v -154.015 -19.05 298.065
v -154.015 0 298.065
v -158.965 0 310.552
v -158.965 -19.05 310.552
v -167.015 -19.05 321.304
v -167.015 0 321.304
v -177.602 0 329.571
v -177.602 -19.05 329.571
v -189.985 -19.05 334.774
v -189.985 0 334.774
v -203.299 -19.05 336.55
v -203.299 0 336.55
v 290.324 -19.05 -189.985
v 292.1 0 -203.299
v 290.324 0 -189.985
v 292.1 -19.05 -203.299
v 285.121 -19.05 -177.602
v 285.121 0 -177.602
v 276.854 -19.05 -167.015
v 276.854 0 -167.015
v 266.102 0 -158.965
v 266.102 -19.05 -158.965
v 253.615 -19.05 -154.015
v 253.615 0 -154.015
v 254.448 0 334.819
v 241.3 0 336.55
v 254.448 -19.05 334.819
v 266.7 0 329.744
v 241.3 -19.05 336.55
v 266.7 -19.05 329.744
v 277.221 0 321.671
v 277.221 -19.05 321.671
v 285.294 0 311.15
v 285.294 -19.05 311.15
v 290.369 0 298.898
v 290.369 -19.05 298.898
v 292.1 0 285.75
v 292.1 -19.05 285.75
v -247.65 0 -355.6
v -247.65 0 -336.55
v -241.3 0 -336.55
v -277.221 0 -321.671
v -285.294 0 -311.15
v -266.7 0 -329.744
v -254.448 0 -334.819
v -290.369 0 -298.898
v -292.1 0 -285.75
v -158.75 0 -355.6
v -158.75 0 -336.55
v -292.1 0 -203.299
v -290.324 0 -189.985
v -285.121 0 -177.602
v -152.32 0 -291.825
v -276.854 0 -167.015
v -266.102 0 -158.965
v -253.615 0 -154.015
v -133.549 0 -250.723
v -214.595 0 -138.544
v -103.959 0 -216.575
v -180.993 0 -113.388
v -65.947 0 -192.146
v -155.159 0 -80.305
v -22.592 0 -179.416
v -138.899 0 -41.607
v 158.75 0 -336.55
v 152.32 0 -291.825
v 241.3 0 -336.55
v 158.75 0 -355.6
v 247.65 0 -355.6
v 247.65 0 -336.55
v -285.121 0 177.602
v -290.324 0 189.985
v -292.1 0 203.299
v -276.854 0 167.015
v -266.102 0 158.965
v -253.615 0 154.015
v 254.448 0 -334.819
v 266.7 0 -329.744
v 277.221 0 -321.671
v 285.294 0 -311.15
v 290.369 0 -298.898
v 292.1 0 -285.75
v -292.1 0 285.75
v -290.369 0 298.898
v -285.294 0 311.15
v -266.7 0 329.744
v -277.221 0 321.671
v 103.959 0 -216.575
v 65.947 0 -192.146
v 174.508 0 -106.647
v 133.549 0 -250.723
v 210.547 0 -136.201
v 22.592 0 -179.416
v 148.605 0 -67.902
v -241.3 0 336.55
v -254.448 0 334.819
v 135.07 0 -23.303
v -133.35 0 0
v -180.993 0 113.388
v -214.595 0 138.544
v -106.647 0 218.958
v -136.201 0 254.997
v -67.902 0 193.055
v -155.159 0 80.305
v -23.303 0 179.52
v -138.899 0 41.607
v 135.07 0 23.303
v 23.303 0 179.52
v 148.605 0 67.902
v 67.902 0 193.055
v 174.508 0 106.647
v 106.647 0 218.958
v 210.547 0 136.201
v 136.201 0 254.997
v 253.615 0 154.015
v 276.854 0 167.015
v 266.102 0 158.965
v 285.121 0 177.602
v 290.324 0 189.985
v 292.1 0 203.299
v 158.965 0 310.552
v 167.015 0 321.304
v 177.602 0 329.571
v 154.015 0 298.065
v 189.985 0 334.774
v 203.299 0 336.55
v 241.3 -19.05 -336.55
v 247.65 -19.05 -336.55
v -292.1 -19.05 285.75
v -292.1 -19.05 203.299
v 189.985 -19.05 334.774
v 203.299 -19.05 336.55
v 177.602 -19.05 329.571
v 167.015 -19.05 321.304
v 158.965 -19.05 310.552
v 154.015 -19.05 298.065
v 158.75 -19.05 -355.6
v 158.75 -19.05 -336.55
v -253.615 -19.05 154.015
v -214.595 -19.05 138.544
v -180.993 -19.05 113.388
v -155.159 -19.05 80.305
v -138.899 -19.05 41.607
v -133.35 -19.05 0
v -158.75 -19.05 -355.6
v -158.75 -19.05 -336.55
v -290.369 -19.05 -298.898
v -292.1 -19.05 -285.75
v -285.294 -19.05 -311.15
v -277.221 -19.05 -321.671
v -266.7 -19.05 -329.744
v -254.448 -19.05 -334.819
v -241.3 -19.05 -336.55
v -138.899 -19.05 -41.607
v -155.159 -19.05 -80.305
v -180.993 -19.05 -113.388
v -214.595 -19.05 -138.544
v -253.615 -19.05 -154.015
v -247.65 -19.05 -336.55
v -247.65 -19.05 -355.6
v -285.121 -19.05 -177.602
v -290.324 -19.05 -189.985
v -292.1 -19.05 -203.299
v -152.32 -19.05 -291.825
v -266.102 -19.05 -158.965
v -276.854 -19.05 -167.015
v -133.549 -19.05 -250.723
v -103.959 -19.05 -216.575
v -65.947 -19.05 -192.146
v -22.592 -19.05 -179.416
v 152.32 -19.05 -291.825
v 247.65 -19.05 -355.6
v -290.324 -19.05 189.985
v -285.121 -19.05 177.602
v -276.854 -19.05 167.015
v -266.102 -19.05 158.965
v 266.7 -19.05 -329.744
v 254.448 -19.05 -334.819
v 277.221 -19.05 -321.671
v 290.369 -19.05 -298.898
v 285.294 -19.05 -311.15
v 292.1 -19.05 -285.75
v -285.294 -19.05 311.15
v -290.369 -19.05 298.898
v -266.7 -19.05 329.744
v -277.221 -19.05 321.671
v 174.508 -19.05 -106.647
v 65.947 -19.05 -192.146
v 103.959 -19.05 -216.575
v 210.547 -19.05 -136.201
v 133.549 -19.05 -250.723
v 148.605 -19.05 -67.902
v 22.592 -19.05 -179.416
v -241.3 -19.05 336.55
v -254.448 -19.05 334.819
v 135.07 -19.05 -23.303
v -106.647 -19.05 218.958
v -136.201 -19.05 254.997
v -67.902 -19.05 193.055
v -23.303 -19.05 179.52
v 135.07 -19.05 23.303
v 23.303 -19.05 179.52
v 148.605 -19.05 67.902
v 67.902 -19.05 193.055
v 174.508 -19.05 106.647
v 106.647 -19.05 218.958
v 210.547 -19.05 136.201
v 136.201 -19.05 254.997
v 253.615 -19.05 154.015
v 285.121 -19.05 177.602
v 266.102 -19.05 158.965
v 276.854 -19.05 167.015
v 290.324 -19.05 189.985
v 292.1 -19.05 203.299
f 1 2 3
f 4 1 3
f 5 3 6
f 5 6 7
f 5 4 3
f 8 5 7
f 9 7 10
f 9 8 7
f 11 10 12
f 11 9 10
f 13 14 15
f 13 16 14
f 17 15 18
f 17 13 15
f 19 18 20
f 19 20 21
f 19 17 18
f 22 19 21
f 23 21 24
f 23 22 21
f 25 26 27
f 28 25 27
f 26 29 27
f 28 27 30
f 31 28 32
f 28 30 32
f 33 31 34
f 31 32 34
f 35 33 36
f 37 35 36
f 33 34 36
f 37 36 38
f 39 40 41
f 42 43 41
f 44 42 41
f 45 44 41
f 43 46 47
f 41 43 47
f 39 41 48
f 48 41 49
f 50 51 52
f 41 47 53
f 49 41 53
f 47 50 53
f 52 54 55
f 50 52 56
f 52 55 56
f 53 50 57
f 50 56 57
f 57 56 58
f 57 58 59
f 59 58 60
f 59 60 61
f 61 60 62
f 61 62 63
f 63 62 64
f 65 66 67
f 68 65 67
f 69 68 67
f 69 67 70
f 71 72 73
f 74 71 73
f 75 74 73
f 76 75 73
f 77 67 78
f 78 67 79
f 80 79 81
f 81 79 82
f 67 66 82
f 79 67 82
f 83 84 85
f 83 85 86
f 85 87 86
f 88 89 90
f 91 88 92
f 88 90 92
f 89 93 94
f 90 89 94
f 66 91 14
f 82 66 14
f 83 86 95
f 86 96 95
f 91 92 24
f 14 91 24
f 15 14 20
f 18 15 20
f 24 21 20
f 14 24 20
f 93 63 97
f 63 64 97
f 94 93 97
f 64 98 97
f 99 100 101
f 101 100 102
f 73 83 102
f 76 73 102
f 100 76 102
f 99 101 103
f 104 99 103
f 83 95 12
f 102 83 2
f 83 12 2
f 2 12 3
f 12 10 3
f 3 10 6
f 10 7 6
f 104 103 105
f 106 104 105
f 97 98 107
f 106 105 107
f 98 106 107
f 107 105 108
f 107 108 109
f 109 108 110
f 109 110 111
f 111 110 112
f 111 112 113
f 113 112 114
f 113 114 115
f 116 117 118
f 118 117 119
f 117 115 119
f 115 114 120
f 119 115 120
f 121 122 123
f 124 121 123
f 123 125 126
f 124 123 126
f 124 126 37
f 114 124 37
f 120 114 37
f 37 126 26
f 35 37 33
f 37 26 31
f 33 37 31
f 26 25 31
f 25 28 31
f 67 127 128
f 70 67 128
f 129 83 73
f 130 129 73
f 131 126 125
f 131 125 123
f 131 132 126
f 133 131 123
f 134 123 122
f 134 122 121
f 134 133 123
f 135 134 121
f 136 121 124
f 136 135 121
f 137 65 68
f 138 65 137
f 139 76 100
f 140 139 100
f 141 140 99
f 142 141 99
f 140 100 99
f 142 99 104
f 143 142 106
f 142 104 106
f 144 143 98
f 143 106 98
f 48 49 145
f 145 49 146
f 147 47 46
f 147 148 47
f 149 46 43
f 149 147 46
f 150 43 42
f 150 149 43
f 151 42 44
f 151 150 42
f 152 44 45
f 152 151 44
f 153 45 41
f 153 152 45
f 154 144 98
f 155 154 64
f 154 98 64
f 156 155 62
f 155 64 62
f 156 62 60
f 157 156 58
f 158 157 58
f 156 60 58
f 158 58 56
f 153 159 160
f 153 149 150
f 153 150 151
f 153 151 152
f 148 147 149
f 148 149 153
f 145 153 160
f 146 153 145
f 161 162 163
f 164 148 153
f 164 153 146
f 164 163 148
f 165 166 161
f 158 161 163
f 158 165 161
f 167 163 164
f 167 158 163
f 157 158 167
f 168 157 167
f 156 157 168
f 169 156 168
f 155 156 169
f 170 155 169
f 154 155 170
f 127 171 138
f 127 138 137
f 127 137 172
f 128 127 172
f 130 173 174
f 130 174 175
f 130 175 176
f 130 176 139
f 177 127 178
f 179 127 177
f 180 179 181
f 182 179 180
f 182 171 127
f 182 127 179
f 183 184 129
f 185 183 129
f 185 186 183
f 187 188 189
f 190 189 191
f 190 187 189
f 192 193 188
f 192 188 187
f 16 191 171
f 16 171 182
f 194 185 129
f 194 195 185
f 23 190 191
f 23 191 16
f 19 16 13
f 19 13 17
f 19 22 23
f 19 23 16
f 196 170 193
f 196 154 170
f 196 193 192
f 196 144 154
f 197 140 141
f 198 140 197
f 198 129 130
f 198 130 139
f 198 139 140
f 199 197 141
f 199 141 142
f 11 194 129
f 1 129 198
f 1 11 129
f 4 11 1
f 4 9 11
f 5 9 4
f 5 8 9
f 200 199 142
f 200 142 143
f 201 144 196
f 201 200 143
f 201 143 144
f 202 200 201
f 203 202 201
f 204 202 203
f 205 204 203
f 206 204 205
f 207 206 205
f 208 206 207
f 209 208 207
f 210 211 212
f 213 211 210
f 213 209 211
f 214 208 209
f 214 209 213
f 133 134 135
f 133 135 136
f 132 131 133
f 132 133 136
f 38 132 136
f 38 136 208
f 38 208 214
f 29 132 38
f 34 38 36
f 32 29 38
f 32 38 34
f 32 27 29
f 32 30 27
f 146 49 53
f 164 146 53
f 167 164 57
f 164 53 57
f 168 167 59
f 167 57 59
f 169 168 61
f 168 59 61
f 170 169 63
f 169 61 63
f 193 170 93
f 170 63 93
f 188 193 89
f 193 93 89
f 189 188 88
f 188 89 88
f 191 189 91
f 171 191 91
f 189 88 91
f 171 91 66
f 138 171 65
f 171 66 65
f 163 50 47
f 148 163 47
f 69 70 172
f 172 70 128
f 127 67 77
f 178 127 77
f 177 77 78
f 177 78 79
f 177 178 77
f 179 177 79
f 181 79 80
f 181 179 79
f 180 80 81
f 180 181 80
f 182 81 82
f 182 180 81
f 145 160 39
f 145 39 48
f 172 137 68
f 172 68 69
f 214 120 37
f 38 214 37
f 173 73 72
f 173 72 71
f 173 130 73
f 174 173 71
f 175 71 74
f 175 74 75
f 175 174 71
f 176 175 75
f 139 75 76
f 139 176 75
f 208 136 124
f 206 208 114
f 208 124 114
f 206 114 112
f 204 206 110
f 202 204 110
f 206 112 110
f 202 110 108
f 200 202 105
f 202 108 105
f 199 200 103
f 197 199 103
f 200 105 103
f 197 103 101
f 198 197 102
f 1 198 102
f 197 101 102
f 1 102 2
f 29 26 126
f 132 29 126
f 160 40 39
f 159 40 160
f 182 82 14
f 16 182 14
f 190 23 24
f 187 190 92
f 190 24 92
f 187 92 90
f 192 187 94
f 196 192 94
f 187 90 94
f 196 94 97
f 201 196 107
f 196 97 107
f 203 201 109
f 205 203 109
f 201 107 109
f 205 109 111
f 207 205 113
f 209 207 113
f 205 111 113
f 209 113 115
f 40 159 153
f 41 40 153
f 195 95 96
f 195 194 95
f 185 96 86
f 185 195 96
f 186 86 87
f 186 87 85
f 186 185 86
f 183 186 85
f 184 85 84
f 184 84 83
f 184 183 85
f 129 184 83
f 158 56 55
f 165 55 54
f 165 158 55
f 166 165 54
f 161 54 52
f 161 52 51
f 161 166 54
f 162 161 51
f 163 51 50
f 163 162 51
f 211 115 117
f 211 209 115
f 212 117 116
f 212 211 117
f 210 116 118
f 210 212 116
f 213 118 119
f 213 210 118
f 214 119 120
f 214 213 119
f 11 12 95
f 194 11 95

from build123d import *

# Parameters (mm, degrees)
F2_DEPTH = 19.05
F3_R     = 50.8
F4_W     = 88.9
F4_H     = 19.05
F5_DEPTH = 19.05


# Not quite as in the source:
# - a variable given as a bare number and used for a length is read in inches; the dataset says mm whatever the document's units were


with BuildPart() as f2:
    # F1 (on Front) → F2 (new body)
    with BuildSketch(Plane.XZ):
        with BuildLine():
            Line((292.1, 336.55), (158.75, 336.55))
            ThreePointArc((158.75, 336.55), (0, 177.8), (-158.75, 336.55))
            Line((-158.75, 336.55), (-292.1, 336.55))
            Line((-292.1, 336.55), (-292.1, 158.75))
            ThreePointArc((-292.1, 158.75), (-179.8467984866, 112.2532015134), (-133.35, 0))
            ThreePointArc((-133.35, 0), (-179.8467984866, -112.2532015134), (-292.1, -158.75))
            Line((-292.1, -158.75), (-292.1, -336.55))
            Line((-292.1, -336.55), (-158.75, -336.55))
            ThreePointArc((-158.75, -336.55), (0, -177.8), (158.75, -336.55))
            Line((158.75, -336.55), (292.1, -336.55))
            Line((292.1, -336.55), (292.1, -158.75))
            ThreePointArc((292.1, -158.75), (133.35, 0), (292.1, 158.75))
            Line((292.1, 158.75), (292.1, 336.55))
        make_face()
    extrude(amount=F2_DEPTH)

    # F3
    f3_edges = [f2.edges().sort_by_distance(p)[0] for p in [
        (158.75, -9.525, 336.55),
        (-158.75, -9.525, 336.55),
        (292.1, -9.525, 158.75),
        (292.1, -9.525, -158.75),
        (-292.1, -9.525, -158.75),
        (-292.1, -9.525, 158.75),
        (292.1, -9.525, -336.55),
        (-292.1, -9.525, -336.55),
        (292.1, -9.525, 336.55),
        (-292.1, -9.525, 336.55),
    ]]
    fillet(f3_edges, radius=F3_R)

    # F4 (on face) → F5 (join)
    with BuildSketch(Plane(origin=(0, 0, -336.55), x_dir=(1, 0, 0), z_dir=(0, 0, -1))):
        with Locations((-203.2, 9.525)):
            Rectangle(F4_W, F4_H)
        with Locations((203.2, 9.525)):
            Rectangle(F4_W, F4_H)
    extrude(amount=F5_DEPTH)


solid = f2.part
